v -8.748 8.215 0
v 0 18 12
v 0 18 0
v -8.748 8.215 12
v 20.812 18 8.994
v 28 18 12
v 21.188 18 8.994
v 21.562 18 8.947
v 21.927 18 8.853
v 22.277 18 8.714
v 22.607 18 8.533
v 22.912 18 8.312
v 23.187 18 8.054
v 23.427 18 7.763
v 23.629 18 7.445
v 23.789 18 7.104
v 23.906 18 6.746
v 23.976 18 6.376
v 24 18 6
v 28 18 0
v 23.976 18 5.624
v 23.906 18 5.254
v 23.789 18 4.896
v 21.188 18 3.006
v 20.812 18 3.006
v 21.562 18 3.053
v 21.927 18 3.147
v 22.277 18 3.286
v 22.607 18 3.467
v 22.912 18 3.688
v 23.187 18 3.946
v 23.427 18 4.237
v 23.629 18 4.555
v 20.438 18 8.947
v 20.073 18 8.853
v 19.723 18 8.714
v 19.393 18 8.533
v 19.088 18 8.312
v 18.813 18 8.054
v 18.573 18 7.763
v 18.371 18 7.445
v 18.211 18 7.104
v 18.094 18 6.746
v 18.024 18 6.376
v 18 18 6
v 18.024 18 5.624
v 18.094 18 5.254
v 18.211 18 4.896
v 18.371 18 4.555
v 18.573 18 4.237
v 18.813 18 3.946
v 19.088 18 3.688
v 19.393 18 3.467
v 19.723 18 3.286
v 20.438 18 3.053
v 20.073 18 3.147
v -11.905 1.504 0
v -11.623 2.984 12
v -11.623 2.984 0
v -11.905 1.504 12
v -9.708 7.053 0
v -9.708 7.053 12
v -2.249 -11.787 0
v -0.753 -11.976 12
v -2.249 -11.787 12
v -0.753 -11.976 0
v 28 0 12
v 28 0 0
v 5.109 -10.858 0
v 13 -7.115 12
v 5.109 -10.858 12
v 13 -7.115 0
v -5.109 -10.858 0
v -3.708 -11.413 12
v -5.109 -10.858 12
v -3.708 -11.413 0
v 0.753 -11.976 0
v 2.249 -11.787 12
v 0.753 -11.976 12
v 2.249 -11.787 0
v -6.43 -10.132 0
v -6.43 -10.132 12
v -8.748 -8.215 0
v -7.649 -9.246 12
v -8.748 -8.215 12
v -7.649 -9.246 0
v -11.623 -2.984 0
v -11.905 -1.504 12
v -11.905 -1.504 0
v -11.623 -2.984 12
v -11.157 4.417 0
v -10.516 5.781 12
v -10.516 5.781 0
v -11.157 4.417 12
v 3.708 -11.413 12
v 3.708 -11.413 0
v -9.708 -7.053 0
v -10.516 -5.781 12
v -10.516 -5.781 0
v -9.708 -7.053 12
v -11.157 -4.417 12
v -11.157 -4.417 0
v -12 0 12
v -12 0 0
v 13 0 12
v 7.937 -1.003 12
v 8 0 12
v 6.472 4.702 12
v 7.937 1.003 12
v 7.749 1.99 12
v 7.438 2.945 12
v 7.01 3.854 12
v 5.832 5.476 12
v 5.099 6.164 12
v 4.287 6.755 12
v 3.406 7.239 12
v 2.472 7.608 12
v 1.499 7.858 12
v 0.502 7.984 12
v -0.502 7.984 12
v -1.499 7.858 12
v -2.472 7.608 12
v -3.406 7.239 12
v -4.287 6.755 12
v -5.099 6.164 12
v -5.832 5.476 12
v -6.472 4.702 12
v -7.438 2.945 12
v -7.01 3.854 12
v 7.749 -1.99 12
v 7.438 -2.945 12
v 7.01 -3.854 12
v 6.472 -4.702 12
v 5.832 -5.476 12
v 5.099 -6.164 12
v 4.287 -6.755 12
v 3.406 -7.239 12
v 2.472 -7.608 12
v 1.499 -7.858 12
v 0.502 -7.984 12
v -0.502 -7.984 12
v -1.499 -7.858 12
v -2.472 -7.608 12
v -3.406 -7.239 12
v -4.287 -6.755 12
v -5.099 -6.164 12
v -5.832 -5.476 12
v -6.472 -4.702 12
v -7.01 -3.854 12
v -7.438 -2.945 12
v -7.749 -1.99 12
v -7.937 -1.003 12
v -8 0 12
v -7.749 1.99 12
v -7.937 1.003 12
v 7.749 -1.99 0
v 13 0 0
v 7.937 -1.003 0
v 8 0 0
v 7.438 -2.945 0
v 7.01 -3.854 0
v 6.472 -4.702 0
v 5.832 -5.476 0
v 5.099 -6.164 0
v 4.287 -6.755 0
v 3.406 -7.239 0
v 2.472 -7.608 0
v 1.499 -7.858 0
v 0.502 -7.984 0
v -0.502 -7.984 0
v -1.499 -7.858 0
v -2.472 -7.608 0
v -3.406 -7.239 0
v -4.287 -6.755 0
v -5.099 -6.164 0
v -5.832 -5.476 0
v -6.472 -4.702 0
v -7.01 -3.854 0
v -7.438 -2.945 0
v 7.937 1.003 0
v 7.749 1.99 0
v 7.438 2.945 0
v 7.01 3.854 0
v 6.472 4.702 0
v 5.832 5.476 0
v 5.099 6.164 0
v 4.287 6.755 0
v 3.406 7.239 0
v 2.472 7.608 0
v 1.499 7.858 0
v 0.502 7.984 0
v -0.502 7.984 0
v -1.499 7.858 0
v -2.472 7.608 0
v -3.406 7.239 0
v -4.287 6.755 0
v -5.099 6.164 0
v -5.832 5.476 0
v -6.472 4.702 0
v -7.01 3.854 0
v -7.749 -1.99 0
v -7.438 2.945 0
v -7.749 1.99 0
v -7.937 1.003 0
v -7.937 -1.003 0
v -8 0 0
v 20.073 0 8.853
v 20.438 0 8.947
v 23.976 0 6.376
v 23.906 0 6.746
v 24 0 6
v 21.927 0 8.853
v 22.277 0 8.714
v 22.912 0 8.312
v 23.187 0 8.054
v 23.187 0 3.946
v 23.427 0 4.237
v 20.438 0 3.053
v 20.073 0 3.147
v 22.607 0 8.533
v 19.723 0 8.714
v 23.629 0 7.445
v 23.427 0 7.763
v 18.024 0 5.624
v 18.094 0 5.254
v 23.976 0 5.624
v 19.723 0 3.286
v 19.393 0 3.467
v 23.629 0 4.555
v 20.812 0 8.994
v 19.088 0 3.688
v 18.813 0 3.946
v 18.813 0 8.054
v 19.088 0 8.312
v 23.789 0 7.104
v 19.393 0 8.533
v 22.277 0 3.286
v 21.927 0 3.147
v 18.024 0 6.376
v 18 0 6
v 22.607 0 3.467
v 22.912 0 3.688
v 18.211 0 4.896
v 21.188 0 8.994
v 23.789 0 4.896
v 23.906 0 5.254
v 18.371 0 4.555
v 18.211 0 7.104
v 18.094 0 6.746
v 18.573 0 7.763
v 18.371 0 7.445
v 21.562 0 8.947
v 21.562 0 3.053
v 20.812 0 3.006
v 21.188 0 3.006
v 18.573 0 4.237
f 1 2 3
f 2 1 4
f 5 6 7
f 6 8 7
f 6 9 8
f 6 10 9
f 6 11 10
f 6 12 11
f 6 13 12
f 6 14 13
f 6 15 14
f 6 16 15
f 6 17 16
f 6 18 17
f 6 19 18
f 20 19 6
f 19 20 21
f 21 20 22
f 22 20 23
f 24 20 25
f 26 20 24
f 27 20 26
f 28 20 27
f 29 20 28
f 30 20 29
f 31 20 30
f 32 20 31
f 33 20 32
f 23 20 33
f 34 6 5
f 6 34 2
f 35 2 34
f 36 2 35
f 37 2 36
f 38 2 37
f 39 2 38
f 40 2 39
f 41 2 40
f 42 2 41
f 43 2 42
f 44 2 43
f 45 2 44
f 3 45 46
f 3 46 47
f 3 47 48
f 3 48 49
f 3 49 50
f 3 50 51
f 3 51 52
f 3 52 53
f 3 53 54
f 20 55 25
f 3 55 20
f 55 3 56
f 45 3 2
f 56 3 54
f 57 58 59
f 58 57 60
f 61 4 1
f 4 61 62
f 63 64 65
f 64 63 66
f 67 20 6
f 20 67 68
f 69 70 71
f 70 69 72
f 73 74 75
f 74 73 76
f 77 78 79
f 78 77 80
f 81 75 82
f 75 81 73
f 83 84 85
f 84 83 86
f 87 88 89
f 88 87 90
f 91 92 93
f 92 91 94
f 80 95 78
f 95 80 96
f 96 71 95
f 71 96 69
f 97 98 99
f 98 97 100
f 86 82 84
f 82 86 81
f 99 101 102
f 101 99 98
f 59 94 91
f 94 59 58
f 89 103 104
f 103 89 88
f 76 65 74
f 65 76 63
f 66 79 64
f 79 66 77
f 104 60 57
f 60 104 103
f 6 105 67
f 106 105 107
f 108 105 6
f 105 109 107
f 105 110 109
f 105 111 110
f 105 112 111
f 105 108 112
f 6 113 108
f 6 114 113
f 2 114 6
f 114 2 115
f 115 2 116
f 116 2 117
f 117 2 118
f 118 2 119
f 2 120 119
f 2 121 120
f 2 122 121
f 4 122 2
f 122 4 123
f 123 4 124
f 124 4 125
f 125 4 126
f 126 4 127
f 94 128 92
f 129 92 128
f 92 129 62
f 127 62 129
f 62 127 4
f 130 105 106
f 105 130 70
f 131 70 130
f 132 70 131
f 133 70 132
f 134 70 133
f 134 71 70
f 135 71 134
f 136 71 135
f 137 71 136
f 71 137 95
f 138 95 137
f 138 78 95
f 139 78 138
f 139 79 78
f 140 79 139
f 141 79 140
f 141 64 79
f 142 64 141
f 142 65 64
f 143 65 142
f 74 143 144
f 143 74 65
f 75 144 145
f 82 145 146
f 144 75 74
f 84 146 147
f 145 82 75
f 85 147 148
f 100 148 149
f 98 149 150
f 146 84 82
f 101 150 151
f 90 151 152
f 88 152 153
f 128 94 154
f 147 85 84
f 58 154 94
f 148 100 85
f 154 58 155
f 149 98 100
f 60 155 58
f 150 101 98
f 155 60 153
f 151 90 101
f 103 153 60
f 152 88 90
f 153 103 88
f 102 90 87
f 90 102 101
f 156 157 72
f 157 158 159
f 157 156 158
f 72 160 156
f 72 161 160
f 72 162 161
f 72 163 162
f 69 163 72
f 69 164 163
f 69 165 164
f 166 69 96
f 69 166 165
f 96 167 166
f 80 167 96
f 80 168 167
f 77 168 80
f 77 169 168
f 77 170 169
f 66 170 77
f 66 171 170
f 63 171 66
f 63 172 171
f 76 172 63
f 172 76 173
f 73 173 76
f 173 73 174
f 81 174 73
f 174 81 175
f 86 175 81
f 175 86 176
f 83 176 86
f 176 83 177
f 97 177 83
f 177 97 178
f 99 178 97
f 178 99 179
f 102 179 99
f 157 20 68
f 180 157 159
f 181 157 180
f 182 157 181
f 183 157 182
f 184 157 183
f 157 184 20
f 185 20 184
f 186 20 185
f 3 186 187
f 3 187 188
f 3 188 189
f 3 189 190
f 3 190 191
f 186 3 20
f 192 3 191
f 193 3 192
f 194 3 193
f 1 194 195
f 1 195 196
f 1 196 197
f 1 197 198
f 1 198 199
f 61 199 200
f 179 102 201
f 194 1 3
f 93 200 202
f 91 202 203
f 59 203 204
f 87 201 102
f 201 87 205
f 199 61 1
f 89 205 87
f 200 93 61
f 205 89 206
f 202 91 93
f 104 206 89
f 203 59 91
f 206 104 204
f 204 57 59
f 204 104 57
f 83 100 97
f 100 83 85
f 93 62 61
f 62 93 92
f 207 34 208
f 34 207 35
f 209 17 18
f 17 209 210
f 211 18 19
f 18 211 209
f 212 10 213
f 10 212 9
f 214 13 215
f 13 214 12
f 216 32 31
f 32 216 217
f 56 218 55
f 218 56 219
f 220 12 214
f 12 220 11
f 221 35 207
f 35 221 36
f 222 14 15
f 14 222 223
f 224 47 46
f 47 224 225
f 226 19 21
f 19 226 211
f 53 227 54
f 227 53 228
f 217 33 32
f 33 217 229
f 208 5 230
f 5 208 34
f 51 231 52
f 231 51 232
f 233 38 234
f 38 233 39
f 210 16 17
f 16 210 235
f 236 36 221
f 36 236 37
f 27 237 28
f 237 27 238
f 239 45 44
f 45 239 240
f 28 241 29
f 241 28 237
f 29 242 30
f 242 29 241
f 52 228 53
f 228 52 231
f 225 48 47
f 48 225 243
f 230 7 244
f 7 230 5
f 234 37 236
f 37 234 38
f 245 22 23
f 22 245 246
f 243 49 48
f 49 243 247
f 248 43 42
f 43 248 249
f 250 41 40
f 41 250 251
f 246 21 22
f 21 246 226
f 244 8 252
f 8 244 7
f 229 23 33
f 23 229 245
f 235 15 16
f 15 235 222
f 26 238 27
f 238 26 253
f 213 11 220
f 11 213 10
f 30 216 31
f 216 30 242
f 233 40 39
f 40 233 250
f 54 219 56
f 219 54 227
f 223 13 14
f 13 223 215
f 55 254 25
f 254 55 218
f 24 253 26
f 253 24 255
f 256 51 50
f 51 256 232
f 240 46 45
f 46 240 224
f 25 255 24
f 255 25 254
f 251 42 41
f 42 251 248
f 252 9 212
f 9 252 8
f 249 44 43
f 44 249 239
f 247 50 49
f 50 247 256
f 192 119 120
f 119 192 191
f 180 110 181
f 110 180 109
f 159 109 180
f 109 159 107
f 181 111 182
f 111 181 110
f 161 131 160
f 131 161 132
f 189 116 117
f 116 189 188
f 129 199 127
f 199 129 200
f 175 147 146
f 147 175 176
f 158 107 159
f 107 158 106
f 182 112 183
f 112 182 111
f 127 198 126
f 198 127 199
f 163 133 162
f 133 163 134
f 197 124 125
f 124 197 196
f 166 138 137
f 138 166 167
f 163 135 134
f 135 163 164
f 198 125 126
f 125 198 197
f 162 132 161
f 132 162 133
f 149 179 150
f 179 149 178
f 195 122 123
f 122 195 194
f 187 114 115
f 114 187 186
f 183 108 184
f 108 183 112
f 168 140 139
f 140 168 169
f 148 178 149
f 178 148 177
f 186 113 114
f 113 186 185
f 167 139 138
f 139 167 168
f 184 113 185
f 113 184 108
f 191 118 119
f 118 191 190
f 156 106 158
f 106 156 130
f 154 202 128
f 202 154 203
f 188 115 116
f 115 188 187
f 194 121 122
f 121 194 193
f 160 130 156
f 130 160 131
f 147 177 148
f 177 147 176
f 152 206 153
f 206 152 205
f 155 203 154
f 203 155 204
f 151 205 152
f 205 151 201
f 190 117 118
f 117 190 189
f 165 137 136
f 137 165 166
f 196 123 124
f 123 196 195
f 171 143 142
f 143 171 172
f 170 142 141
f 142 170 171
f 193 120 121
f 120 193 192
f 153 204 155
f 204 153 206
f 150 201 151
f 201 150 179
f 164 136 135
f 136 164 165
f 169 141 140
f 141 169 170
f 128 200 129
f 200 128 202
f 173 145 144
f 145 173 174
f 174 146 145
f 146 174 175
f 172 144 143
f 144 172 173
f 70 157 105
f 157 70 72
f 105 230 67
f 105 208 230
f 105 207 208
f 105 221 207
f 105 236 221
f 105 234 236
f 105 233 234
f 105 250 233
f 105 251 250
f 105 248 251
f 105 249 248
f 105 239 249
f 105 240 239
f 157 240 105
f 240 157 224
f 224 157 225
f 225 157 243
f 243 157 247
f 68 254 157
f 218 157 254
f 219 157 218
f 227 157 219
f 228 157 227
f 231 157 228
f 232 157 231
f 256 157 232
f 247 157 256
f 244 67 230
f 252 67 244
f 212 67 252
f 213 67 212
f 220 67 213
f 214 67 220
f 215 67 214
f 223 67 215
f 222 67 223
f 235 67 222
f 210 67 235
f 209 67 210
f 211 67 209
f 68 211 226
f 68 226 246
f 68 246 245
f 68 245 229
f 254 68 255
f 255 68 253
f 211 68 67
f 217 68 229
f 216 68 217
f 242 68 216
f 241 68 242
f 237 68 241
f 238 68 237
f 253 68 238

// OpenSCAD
$fn=50; 

difference(){
hull() {
    cylinder( r=12, h=12 );
    cube([2*14,18, 12]);  
}
translate([21,30,6]) rotate([90,0,0]) cylinder(r=3, h=40);
//translate([12,21,14]) rotate([90,0,0]) cylinder(r=3, h=40);
cylinder( r=8, h=21 ); //bearing 
translate([13,-10,0]) cube([20,10,20]); 
}
